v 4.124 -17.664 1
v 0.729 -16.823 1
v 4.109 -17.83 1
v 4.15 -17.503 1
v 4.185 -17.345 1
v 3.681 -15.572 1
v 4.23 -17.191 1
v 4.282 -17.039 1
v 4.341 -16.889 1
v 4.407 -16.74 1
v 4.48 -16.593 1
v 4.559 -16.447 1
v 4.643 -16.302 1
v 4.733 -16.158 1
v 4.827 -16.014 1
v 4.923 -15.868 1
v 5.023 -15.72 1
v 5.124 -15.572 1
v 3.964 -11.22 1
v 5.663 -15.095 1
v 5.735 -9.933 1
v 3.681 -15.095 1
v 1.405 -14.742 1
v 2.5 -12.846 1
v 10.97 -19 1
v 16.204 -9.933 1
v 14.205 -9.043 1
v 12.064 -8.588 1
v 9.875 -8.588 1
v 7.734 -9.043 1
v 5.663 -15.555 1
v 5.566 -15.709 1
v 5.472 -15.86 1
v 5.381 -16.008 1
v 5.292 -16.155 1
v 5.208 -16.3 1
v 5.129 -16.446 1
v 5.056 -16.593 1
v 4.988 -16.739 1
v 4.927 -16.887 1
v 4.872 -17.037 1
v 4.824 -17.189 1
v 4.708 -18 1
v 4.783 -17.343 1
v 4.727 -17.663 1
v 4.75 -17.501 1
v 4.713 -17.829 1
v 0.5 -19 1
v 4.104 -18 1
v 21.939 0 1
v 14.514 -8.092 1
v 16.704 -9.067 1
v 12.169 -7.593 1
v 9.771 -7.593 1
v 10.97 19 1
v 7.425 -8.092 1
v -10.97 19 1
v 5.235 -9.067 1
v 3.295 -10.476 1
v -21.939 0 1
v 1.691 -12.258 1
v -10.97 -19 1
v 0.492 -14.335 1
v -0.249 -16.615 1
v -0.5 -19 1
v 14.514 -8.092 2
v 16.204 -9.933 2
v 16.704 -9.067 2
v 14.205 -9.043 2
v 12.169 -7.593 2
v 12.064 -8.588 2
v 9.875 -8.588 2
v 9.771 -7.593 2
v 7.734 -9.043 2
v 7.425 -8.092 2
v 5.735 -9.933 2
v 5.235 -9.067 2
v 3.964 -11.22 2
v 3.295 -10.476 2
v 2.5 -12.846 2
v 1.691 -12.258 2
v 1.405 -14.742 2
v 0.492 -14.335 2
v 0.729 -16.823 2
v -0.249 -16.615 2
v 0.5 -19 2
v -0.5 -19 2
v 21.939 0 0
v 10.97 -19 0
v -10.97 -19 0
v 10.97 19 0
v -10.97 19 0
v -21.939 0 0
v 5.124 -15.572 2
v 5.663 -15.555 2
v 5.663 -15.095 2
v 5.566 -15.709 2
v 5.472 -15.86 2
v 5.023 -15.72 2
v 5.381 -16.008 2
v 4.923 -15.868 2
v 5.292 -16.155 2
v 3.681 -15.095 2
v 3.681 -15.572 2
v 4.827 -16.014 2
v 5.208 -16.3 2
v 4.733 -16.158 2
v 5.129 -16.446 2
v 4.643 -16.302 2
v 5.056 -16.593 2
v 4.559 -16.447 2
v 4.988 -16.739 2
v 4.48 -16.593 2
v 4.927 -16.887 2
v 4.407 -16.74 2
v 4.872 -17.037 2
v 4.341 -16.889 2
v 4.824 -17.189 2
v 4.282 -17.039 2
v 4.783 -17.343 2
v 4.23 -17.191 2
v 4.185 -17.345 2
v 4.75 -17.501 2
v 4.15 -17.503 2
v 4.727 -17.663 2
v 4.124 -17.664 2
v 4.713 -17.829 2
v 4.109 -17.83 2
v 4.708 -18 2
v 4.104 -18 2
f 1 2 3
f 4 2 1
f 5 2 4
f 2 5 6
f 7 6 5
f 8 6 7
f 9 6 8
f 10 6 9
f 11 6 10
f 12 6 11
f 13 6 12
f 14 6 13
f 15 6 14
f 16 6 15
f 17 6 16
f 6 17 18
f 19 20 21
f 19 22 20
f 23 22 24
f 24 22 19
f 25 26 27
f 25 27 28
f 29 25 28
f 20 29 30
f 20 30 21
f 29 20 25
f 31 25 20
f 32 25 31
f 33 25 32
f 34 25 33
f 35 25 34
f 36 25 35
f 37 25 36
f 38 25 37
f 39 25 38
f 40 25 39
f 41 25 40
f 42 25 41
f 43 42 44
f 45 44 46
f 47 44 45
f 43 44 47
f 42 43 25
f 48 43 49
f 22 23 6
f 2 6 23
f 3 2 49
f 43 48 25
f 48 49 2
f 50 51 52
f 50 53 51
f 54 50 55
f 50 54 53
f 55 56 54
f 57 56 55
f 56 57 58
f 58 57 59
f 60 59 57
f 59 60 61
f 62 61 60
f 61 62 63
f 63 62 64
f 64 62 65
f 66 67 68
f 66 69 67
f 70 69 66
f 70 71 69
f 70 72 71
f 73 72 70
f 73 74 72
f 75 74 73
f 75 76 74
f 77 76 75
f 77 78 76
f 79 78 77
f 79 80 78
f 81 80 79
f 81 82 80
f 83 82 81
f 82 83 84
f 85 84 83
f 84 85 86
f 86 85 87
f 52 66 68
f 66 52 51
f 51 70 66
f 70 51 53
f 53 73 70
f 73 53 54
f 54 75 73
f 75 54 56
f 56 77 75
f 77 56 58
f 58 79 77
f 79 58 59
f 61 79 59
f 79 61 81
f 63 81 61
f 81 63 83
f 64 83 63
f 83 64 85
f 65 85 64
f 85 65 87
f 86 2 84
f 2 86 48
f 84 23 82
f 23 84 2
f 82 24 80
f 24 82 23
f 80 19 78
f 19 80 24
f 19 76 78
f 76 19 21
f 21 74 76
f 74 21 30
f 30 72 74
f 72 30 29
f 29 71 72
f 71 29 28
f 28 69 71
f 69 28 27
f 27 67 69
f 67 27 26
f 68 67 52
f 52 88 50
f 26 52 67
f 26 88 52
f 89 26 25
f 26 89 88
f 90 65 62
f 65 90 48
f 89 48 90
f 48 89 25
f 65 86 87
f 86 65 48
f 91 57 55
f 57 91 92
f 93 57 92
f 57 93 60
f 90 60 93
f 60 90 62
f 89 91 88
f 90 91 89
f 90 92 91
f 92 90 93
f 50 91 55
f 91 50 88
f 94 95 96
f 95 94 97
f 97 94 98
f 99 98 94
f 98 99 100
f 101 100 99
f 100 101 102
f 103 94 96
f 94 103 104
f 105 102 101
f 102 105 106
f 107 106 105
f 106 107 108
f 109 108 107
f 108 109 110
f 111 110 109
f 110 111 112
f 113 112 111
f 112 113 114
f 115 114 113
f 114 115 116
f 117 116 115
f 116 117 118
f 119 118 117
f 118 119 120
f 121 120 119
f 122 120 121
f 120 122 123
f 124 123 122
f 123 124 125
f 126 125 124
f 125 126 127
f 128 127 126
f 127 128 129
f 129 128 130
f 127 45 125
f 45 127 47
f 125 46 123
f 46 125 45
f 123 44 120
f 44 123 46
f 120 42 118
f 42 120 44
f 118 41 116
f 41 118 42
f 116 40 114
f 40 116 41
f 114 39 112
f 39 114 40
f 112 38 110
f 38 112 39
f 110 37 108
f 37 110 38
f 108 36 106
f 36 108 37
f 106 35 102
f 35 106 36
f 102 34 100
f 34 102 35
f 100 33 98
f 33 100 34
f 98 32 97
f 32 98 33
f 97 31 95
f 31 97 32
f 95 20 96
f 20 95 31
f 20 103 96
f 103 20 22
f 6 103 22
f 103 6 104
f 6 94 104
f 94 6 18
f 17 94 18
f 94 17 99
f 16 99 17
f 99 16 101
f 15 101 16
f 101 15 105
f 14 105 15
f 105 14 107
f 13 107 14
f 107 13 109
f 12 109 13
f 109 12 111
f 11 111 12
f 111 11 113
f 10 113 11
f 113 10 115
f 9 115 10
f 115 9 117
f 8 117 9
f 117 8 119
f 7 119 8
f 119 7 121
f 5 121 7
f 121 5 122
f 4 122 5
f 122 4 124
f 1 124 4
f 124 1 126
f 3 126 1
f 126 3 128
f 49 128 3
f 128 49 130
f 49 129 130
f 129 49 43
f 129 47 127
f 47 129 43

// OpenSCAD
include <../Scripts/18xx tiles basic functions.scad>
hex();
put_tilenr("7");
sharp_curve();
